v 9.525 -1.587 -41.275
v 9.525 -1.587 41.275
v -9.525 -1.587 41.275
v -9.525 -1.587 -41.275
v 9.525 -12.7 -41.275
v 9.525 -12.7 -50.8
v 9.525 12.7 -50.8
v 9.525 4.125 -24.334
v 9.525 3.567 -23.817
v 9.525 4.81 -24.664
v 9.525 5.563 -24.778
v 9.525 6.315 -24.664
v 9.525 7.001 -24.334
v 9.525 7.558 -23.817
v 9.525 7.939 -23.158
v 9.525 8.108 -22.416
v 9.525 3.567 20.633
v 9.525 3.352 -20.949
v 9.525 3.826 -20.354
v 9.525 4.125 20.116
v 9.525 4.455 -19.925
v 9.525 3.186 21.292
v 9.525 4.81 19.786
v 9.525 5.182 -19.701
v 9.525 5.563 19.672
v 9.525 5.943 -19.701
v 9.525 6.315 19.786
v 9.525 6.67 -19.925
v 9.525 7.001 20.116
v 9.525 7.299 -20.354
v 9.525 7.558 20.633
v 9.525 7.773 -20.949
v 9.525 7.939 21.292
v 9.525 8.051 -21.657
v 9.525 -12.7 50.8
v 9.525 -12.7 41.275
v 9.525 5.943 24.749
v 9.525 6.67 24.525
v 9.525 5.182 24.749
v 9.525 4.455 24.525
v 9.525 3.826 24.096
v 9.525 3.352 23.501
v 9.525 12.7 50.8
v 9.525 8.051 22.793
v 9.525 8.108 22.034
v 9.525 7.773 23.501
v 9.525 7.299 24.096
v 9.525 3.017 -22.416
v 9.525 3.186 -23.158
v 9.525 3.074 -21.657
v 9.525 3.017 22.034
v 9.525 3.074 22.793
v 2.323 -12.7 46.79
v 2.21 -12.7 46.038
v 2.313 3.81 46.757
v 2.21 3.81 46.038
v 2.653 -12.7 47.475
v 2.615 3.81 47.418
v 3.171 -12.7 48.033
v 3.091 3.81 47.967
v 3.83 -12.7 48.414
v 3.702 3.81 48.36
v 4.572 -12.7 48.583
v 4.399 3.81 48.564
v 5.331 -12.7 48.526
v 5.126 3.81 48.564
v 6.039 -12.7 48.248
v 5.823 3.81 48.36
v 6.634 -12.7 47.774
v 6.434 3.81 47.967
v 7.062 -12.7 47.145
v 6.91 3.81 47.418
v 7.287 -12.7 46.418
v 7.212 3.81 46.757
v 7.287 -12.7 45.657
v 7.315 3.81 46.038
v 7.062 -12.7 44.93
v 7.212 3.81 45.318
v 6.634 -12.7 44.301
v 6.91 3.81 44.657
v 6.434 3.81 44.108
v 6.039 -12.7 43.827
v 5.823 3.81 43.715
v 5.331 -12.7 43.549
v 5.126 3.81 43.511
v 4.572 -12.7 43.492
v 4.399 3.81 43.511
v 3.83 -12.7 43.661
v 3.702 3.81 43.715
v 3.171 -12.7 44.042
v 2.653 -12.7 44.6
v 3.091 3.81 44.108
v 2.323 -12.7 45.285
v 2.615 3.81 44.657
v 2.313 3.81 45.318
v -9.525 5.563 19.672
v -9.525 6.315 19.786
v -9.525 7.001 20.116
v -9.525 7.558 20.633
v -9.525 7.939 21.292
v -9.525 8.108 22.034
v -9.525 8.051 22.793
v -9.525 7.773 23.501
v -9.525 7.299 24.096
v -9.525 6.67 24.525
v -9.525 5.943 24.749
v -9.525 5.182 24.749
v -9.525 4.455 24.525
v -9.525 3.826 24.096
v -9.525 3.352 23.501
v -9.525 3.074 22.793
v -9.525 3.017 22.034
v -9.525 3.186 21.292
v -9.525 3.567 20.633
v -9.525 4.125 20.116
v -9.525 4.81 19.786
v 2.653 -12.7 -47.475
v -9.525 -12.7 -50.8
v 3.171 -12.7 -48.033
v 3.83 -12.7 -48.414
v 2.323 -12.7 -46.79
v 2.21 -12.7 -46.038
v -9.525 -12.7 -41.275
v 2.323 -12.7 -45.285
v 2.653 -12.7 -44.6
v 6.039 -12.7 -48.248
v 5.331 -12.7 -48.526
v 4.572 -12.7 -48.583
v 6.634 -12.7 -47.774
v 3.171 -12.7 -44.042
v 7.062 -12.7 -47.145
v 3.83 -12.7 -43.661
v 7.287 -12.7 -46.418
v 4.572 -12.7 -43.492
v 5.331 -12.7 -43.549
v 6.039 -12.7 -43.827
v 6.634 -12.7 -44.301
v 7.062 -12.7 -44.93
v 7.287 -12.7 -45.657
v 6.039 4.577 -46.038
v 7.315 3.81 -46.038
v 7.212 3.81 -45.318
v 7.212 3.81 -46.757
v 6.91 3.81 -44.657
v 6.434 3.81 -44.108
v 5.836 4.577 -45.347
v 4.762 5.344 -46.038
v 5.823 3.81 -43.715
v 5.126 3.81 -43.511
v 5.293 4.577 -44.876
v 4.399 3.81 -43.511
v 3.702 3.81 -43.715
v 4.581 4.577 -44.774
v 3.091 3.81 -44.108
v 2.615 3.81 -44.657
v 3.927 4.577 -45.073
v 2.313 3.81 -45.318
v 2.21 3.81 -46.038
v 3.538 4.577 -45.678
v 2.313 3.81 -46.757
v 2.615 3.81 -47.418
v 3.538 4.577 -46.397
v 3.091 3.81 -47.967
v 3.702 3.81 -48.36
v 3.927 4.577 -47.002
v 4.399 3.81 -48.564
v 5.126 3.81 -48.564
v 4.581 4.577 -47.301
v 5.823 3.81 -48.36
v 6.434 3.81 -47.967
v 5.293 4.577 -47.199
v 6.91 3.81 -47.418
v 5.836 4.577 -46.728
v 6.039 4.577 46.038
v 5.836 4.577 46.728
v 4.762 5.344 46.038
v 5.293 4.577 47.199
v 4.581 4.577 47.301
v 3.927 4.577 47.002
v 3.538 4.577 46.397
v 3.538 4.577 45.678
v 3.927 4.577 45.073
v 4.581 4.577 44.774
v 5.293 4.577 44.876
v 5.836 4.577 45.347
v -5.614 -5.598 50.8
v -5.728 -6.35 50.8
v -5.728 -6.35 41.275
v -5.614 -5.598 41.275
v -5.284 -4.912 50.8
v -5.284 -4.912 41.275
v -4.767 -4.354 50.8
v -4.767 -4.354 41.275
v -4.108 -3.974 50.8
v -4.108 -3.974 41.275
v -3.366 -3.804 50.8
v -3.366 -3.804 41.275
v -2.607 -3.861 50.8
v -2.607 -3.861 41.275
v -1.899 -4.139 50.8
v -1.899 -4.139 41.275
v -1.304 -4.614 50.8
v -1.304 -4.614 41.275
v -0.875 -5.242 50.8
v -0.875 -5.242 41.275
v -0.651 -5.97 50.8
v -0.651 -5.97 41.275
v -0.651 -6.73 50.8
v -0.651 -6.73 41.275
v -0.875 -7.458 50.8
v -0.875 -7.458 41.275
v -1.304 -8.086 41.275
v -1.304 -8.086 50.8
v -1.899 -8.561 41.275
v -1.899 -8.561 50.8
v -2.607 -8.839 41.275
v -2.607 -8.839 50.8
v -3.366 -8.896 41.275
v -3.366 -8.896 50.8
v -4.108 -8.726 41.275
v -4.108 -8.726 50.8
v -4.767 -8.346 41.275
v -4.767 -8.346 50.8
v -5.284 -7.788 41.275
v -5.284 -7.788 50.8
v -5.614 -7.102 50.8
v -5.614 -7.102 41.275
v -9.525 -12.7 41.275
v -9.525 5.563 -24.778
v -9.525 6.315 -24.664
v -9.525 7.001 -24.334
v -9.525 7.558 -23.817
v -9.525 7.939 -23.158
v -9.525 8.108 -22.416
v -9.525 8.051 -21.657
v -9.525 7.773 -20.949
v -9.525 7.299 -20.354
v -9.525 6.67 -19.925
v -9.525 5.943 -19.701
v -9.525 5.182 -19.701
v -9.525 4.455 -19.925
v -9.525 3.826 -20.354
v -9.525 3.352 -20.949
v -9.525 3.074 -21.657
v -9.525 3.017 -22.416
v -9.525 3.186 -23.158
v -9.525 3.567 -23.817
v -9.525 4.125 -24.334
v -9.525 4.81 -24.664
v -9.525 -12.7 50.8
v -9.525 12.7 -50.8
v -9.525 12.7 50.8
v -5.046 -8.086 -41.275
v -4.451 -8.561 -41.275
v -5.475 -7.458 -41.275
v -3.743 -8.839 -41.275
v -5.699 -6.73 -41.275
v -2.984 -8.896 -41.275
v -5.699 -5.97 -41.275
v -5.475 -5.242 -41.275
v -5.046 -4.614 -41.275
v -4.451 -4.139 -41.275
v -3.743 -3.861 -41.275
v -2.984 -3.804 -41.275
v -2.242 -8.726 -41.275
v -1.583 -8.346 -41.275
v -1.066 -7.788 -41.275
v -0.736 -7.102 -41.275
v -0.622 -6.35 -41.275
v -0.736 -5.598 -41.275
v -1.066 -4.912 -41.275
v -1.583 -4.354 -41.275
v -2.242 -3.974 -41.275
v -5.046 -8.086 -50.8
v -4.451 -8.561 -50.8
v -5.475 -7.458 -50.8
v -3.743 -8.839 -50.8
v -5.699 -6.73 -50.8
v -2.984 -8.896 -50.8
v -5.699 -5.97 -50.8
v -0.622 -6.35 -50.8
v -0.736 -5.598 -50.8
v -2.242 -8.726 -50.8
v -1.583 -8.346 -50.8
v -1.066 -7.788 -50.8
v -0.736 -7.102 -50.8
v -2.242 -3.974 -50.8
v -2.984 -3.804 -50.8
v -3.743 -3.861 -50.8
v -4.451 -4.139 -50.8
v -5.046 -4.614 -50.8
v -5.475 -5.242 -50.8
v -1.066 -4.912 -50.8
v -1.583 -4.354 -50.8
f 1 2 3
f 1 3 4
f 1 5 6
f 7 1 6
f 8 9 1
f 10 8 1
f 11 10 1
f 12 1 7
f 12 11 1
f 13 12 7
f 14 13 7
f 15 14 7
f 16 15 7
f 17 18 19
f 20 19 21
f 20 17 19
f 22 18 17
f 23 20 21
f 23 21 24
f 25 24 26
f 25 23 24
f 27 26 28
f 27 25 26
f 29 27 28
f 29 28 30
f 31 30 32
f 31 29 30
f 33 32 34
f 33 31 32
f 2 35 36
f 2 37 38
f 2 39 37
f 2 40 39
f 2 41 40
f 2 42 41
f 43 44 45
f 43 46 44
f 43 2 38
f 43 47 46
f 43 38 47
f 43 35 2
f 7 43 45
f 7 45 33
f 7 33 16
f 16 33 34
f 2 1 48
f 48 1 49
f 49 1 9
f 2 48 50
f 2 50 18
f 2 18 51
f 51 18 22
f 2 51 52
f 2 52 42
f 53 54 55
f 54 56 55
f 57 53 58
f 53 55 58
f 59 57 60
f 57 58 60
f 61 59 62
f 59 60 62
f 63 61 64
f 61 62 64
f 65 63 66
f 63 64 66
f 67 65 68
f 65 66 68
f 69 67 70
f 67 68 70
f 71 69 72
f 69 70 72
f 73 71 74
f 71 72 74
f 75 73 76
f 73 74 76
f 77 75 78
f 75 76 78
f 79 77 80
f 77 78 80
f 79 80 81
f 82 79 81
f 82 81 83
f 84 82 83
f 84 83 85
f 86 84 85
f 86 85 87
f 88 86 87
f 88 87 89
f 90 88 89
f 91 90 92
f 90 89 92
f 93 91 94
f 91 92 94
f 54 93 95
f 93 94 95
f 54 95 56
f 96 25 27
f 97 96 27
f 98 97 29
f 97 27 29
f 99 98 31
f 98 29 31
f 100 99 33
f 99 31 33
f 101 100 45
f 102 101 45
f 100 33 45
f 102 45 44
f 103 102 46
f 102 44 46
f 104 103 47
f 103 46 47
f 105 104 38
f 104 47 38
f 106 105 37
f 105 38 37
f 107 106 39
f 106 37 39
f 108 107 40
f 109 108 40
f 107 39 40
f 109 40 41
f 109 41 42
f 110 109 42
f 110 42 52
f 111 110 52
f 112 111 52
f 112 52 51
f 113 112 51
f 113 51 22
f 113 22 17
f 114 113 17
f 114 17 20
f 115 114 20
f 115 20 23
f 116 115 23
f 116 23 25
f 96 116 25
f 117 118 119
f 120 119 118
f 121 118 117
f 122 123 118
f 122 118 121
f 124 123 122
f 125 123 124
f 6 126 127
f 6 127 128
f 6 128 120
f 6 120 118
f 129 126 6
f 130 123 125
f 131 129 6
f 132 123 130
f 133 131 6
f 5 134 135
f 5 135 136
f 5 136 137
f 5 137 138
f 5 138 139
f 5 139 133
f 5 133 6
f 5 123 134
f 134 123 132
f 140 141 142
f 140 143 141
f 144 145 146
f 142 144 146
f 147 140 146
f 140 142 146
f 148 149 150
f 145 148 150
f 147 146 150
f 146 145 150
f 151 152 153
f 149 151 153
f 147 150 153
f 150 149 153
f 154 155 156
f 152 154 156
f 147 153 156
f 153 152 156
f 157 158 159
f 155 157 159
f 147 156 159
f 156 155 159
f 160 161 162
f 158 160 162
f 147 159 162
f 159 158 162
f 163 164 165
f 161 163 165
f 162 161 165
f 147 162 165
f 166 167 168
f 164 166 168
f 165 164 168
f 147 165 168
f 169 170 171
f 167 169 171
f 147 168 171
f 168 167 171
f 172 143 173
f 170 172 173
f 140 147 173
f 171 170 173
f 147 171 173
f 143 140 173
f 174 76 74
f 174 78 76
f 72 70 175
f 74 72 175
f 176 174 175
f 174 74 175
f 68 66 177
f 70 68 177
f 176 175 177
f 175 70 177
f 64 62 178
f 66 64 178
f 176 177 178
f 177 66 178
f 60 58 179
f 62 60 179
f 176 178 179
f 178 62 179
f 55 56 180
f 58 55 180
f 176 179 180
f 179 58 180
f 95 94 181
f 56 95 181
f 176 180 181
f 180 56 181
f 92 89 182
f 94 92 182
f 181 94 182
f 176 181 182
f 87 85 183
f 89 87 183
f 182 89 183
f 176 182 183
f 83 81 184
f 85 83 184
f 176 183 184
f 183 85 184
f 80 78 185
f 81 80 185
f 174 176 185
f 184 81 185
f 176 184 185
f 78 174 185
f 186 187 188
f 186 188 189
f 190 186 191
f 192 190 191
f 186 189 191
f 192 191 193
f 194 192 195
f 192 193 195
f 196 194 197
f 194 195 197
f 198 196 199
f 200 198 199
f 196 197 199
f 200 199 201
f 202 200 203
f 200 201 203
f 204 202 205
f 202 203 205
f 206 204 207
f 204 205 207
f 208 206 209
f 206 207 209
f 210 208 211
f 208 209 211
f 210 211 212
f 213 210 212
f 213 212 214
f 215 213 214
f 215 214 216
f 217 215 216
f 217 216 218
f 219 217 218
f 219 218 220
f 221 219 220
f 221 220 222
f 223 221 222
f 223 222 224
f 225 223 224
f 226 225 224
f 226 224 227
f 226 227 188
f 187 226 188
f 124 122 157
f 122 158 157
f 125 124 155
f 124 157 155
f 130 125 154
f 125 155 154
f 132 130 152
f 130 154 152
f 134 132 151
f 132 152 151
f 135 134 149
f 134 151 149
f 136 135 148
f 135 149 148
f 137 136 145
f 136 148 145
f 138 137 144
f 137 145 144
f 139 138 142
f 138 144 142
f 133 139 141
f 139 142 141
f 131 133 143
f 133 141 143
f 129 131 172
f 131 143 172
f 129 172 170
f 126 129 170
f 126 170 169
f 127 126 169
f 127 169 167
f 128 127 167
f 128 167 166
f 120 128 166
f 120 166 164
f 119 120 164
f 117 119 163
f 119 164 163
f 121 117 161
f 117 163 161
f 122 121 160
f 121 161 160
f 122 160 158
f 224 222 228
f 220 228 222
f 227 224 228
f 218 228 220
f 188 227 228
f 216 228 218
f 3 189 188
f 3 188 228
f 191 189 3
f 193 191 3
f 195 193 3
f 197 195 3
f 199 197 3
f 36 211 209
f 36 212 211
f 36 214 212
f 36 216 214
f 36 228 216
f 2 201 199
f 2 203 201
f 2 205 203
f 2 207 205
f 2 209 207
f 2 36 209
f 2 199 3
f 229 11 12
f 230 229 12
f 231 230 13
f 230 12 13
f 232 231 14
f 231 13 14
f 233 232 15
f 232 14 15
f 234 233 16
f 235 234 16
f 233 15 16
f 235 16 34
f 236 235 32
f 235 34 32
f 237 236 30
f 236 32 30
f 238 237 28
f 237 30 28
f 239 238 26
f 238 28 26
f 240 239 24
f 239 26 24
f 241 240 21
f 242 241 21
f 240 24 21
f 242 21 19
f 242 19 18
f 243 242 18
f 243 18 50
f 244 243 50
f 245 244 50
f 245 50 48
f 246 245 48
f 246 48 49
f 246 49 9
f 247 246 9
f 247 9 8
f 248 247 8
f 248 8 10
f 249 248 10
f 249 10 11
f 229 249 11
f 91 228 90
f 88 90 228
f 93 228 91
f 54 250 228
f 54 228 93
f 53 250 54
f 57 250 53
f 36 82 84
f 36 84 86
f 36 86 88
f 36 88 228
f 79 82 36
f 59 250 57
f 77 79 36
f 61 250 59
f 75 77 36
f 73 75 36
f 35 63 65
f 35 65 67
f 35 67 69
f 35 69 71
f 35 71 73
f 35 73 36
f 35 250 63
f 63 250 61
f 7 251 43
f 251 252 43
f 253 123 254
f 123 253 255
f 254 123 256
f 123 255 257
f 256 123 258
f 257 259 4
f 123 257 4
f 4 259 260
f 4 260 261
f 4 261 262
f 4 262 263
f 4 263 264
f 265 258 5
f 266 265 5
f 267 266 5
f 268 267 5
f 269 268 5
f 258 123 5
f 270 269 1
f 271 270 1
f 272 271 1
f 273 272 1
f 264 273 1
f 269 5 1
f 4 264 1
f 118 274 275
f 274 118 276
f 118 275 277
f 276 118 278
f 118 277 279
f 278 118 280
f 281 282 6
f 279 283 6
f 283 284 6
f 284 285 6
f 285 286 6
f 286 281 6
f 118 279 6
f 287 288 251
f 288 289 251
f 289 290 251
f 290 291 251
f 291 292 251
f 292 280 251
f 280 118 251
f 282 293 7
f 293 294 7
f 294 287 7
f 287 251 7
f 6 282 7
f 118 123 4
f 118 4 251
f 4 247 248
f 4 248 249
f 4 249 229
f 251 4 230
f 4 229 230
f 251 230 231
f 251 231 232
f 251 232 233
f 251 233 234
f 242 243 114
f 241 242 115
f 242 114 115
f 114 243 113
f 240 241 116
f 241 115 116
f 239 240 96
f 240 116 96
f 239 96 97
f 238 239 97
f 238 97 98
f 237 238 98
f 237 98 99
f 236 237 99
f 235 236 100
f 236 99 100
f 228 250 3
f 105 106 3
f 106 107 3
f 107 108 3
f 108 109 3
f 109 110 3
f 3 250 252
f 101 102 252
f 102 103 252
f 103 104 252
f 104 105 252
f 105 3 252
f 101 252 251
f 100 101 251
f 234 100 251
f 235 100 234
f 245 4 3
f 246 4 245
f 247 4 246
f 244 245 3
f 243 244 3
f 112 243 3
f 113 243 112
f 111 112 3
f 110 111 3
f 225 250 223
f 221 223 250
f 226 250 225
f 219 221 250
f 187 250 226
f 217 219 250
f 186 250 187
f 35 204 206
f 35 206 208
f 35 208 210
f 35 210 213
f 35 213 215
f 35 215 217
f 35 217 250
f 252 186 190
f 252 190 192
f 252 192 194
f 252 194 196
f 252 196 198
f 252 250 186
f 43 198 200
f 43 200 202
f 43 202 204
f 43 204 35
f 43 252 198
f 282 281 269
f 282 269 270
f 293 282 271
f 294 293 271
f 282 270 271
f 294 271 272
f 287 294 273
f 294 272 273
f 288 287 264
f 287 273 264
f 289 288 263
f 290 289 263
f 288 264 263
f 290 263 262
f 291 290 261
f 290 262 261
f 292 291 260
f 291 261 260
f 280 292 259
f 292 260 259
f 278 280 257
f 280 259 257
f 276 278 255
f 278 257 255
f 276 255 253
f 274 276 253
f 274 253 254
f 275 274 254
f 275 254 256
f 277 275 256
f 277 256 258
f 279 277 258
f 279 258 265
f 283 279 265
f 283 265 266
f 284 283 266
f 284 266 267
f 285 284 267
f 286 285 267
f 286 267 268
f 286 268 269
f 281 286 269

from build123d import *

# Parameters (mm, degrees)
SKETCH1_W                   = 19.05
SKETCH1_H                   = 25.4
EXTRUDE1_DEPTH              = 50.8
CUT_EXTRUDE1_REACH          = 21.05
SKETCH2_W                   = 82.55
SKETCH2_H                   = 11.1125
F_1_4_20_TAPPED_HOLE1_D     = 5.1054
F_1_4_20_TAPPED_HOLE1_DEPTH = 9.525
F_1_4_20_TAPPED_HOLE2_D     = 5.1054
F_1_4_20_TAPPED_HOLE2_DEPTH = 9.525
F_1_4_20_TAPPED_HOLE3_D     = 5.1054
F_1_4_20_TAPPED_HOLE3_DEPTH = 16.51
F_1_4_20_TAPPED_HOLE3_TIP   = 1.533816902
F_1_4_20_TAPPED_HOLE4_D     = 5.1054
F_1_4_20_TAPPED_HOLE4_DEPTH = 19.05


with BuildPart() as part:
    # Sketch1 → Extrude1 (new body, symmetric)
    with BuildSketch(Plane.XY):
        Rectangle(SKETCH1_W, SKETCH1_H)
    extrude(amount=EXTRUDE1_DEPTH, both=True)

    # Sketch2 → Cut-Extrude1 (cut, up to next)
    with BuildSketch(Plane(origin=(9.525, 0, 0), x_dir=(0, 0, -1), z_dir=(1, 0, 0)), mode=Mode.PRIVATE) as cut_extrude1_sk1:
        with Locations((0, -7.14375)):
            Rectangle(SKETCH2_W, SKETCH2_H)
    cut_extrude1_tool1 = extrude(cut_extrude1_sk1.sketch, amount=-CUT_EXTRUDE1_REACH, mode=Mode.PRIVATE) & part.part
    add(cut_extrude1_tool1.solids().sort_by_distance((9.525, -7.14375, 0))[0], mode=Mode.SUBTRACT)

    # 1/4-20 Tapped Hole1
    with Locations(Plane(origin=(0, 0, -50.8), x_dir=(-1, 0, 0), z_dir=(0, 0, -1))):
        with Locations((3.175, -6.35)):
            Hole(F_1_4_20_TAPPED_HOLE1_D / 2, depth=F_1_4_20_TAPPED_HOLE1_DEPTH)

    # 1/4-20 Tapped Hole2
    with Locations(Plane.XY.offset(50.8)):
        with Locations((-3.175, -6.35)):
            Hole(F_1_4_20_TAPPED_HOLE2_D / 2, depth=F_1_4_20_TAPPED_HOLE2_DEPTH)

    # 1/4-20 Tapped Hole3
    with Locations(Plane.XZ.offset(12.7)):
        with Locations((4.7625, 46.0375), (4.7625, -46.0375)):
            Hole(F_1_4_20_TAPPED_HOLE3_D / 2, depth=F_1_4_20_TAPPED_HOLE3_DEPTH)
            with Locations((0, 0, -(F_1_4_20_TAPPED_HOLE3_DEPTH + F_1_4_20_TAPPED_HOLE3_TIP / 2))):  # 118° drill point
                Cone(0, F_1_4_20_TAPPED_HOLE3_D / 2, F_1_4_20_TAPPED_HOLE3_TIP, mode=Mode.SUBTRACT)

    # 1/4-20 Tapped Hole4
    with Locations(Plane.ZY.offset(9.525)):
        with Locations((-22.225, 5.5626), (22.225, 5.5626)):
            Hole(F_1_4_20_TAPPED_HOLE4_D / 2, depth=F_1_4_20_TAPPED_HOLE4_DEPTH)


solid = part.part
